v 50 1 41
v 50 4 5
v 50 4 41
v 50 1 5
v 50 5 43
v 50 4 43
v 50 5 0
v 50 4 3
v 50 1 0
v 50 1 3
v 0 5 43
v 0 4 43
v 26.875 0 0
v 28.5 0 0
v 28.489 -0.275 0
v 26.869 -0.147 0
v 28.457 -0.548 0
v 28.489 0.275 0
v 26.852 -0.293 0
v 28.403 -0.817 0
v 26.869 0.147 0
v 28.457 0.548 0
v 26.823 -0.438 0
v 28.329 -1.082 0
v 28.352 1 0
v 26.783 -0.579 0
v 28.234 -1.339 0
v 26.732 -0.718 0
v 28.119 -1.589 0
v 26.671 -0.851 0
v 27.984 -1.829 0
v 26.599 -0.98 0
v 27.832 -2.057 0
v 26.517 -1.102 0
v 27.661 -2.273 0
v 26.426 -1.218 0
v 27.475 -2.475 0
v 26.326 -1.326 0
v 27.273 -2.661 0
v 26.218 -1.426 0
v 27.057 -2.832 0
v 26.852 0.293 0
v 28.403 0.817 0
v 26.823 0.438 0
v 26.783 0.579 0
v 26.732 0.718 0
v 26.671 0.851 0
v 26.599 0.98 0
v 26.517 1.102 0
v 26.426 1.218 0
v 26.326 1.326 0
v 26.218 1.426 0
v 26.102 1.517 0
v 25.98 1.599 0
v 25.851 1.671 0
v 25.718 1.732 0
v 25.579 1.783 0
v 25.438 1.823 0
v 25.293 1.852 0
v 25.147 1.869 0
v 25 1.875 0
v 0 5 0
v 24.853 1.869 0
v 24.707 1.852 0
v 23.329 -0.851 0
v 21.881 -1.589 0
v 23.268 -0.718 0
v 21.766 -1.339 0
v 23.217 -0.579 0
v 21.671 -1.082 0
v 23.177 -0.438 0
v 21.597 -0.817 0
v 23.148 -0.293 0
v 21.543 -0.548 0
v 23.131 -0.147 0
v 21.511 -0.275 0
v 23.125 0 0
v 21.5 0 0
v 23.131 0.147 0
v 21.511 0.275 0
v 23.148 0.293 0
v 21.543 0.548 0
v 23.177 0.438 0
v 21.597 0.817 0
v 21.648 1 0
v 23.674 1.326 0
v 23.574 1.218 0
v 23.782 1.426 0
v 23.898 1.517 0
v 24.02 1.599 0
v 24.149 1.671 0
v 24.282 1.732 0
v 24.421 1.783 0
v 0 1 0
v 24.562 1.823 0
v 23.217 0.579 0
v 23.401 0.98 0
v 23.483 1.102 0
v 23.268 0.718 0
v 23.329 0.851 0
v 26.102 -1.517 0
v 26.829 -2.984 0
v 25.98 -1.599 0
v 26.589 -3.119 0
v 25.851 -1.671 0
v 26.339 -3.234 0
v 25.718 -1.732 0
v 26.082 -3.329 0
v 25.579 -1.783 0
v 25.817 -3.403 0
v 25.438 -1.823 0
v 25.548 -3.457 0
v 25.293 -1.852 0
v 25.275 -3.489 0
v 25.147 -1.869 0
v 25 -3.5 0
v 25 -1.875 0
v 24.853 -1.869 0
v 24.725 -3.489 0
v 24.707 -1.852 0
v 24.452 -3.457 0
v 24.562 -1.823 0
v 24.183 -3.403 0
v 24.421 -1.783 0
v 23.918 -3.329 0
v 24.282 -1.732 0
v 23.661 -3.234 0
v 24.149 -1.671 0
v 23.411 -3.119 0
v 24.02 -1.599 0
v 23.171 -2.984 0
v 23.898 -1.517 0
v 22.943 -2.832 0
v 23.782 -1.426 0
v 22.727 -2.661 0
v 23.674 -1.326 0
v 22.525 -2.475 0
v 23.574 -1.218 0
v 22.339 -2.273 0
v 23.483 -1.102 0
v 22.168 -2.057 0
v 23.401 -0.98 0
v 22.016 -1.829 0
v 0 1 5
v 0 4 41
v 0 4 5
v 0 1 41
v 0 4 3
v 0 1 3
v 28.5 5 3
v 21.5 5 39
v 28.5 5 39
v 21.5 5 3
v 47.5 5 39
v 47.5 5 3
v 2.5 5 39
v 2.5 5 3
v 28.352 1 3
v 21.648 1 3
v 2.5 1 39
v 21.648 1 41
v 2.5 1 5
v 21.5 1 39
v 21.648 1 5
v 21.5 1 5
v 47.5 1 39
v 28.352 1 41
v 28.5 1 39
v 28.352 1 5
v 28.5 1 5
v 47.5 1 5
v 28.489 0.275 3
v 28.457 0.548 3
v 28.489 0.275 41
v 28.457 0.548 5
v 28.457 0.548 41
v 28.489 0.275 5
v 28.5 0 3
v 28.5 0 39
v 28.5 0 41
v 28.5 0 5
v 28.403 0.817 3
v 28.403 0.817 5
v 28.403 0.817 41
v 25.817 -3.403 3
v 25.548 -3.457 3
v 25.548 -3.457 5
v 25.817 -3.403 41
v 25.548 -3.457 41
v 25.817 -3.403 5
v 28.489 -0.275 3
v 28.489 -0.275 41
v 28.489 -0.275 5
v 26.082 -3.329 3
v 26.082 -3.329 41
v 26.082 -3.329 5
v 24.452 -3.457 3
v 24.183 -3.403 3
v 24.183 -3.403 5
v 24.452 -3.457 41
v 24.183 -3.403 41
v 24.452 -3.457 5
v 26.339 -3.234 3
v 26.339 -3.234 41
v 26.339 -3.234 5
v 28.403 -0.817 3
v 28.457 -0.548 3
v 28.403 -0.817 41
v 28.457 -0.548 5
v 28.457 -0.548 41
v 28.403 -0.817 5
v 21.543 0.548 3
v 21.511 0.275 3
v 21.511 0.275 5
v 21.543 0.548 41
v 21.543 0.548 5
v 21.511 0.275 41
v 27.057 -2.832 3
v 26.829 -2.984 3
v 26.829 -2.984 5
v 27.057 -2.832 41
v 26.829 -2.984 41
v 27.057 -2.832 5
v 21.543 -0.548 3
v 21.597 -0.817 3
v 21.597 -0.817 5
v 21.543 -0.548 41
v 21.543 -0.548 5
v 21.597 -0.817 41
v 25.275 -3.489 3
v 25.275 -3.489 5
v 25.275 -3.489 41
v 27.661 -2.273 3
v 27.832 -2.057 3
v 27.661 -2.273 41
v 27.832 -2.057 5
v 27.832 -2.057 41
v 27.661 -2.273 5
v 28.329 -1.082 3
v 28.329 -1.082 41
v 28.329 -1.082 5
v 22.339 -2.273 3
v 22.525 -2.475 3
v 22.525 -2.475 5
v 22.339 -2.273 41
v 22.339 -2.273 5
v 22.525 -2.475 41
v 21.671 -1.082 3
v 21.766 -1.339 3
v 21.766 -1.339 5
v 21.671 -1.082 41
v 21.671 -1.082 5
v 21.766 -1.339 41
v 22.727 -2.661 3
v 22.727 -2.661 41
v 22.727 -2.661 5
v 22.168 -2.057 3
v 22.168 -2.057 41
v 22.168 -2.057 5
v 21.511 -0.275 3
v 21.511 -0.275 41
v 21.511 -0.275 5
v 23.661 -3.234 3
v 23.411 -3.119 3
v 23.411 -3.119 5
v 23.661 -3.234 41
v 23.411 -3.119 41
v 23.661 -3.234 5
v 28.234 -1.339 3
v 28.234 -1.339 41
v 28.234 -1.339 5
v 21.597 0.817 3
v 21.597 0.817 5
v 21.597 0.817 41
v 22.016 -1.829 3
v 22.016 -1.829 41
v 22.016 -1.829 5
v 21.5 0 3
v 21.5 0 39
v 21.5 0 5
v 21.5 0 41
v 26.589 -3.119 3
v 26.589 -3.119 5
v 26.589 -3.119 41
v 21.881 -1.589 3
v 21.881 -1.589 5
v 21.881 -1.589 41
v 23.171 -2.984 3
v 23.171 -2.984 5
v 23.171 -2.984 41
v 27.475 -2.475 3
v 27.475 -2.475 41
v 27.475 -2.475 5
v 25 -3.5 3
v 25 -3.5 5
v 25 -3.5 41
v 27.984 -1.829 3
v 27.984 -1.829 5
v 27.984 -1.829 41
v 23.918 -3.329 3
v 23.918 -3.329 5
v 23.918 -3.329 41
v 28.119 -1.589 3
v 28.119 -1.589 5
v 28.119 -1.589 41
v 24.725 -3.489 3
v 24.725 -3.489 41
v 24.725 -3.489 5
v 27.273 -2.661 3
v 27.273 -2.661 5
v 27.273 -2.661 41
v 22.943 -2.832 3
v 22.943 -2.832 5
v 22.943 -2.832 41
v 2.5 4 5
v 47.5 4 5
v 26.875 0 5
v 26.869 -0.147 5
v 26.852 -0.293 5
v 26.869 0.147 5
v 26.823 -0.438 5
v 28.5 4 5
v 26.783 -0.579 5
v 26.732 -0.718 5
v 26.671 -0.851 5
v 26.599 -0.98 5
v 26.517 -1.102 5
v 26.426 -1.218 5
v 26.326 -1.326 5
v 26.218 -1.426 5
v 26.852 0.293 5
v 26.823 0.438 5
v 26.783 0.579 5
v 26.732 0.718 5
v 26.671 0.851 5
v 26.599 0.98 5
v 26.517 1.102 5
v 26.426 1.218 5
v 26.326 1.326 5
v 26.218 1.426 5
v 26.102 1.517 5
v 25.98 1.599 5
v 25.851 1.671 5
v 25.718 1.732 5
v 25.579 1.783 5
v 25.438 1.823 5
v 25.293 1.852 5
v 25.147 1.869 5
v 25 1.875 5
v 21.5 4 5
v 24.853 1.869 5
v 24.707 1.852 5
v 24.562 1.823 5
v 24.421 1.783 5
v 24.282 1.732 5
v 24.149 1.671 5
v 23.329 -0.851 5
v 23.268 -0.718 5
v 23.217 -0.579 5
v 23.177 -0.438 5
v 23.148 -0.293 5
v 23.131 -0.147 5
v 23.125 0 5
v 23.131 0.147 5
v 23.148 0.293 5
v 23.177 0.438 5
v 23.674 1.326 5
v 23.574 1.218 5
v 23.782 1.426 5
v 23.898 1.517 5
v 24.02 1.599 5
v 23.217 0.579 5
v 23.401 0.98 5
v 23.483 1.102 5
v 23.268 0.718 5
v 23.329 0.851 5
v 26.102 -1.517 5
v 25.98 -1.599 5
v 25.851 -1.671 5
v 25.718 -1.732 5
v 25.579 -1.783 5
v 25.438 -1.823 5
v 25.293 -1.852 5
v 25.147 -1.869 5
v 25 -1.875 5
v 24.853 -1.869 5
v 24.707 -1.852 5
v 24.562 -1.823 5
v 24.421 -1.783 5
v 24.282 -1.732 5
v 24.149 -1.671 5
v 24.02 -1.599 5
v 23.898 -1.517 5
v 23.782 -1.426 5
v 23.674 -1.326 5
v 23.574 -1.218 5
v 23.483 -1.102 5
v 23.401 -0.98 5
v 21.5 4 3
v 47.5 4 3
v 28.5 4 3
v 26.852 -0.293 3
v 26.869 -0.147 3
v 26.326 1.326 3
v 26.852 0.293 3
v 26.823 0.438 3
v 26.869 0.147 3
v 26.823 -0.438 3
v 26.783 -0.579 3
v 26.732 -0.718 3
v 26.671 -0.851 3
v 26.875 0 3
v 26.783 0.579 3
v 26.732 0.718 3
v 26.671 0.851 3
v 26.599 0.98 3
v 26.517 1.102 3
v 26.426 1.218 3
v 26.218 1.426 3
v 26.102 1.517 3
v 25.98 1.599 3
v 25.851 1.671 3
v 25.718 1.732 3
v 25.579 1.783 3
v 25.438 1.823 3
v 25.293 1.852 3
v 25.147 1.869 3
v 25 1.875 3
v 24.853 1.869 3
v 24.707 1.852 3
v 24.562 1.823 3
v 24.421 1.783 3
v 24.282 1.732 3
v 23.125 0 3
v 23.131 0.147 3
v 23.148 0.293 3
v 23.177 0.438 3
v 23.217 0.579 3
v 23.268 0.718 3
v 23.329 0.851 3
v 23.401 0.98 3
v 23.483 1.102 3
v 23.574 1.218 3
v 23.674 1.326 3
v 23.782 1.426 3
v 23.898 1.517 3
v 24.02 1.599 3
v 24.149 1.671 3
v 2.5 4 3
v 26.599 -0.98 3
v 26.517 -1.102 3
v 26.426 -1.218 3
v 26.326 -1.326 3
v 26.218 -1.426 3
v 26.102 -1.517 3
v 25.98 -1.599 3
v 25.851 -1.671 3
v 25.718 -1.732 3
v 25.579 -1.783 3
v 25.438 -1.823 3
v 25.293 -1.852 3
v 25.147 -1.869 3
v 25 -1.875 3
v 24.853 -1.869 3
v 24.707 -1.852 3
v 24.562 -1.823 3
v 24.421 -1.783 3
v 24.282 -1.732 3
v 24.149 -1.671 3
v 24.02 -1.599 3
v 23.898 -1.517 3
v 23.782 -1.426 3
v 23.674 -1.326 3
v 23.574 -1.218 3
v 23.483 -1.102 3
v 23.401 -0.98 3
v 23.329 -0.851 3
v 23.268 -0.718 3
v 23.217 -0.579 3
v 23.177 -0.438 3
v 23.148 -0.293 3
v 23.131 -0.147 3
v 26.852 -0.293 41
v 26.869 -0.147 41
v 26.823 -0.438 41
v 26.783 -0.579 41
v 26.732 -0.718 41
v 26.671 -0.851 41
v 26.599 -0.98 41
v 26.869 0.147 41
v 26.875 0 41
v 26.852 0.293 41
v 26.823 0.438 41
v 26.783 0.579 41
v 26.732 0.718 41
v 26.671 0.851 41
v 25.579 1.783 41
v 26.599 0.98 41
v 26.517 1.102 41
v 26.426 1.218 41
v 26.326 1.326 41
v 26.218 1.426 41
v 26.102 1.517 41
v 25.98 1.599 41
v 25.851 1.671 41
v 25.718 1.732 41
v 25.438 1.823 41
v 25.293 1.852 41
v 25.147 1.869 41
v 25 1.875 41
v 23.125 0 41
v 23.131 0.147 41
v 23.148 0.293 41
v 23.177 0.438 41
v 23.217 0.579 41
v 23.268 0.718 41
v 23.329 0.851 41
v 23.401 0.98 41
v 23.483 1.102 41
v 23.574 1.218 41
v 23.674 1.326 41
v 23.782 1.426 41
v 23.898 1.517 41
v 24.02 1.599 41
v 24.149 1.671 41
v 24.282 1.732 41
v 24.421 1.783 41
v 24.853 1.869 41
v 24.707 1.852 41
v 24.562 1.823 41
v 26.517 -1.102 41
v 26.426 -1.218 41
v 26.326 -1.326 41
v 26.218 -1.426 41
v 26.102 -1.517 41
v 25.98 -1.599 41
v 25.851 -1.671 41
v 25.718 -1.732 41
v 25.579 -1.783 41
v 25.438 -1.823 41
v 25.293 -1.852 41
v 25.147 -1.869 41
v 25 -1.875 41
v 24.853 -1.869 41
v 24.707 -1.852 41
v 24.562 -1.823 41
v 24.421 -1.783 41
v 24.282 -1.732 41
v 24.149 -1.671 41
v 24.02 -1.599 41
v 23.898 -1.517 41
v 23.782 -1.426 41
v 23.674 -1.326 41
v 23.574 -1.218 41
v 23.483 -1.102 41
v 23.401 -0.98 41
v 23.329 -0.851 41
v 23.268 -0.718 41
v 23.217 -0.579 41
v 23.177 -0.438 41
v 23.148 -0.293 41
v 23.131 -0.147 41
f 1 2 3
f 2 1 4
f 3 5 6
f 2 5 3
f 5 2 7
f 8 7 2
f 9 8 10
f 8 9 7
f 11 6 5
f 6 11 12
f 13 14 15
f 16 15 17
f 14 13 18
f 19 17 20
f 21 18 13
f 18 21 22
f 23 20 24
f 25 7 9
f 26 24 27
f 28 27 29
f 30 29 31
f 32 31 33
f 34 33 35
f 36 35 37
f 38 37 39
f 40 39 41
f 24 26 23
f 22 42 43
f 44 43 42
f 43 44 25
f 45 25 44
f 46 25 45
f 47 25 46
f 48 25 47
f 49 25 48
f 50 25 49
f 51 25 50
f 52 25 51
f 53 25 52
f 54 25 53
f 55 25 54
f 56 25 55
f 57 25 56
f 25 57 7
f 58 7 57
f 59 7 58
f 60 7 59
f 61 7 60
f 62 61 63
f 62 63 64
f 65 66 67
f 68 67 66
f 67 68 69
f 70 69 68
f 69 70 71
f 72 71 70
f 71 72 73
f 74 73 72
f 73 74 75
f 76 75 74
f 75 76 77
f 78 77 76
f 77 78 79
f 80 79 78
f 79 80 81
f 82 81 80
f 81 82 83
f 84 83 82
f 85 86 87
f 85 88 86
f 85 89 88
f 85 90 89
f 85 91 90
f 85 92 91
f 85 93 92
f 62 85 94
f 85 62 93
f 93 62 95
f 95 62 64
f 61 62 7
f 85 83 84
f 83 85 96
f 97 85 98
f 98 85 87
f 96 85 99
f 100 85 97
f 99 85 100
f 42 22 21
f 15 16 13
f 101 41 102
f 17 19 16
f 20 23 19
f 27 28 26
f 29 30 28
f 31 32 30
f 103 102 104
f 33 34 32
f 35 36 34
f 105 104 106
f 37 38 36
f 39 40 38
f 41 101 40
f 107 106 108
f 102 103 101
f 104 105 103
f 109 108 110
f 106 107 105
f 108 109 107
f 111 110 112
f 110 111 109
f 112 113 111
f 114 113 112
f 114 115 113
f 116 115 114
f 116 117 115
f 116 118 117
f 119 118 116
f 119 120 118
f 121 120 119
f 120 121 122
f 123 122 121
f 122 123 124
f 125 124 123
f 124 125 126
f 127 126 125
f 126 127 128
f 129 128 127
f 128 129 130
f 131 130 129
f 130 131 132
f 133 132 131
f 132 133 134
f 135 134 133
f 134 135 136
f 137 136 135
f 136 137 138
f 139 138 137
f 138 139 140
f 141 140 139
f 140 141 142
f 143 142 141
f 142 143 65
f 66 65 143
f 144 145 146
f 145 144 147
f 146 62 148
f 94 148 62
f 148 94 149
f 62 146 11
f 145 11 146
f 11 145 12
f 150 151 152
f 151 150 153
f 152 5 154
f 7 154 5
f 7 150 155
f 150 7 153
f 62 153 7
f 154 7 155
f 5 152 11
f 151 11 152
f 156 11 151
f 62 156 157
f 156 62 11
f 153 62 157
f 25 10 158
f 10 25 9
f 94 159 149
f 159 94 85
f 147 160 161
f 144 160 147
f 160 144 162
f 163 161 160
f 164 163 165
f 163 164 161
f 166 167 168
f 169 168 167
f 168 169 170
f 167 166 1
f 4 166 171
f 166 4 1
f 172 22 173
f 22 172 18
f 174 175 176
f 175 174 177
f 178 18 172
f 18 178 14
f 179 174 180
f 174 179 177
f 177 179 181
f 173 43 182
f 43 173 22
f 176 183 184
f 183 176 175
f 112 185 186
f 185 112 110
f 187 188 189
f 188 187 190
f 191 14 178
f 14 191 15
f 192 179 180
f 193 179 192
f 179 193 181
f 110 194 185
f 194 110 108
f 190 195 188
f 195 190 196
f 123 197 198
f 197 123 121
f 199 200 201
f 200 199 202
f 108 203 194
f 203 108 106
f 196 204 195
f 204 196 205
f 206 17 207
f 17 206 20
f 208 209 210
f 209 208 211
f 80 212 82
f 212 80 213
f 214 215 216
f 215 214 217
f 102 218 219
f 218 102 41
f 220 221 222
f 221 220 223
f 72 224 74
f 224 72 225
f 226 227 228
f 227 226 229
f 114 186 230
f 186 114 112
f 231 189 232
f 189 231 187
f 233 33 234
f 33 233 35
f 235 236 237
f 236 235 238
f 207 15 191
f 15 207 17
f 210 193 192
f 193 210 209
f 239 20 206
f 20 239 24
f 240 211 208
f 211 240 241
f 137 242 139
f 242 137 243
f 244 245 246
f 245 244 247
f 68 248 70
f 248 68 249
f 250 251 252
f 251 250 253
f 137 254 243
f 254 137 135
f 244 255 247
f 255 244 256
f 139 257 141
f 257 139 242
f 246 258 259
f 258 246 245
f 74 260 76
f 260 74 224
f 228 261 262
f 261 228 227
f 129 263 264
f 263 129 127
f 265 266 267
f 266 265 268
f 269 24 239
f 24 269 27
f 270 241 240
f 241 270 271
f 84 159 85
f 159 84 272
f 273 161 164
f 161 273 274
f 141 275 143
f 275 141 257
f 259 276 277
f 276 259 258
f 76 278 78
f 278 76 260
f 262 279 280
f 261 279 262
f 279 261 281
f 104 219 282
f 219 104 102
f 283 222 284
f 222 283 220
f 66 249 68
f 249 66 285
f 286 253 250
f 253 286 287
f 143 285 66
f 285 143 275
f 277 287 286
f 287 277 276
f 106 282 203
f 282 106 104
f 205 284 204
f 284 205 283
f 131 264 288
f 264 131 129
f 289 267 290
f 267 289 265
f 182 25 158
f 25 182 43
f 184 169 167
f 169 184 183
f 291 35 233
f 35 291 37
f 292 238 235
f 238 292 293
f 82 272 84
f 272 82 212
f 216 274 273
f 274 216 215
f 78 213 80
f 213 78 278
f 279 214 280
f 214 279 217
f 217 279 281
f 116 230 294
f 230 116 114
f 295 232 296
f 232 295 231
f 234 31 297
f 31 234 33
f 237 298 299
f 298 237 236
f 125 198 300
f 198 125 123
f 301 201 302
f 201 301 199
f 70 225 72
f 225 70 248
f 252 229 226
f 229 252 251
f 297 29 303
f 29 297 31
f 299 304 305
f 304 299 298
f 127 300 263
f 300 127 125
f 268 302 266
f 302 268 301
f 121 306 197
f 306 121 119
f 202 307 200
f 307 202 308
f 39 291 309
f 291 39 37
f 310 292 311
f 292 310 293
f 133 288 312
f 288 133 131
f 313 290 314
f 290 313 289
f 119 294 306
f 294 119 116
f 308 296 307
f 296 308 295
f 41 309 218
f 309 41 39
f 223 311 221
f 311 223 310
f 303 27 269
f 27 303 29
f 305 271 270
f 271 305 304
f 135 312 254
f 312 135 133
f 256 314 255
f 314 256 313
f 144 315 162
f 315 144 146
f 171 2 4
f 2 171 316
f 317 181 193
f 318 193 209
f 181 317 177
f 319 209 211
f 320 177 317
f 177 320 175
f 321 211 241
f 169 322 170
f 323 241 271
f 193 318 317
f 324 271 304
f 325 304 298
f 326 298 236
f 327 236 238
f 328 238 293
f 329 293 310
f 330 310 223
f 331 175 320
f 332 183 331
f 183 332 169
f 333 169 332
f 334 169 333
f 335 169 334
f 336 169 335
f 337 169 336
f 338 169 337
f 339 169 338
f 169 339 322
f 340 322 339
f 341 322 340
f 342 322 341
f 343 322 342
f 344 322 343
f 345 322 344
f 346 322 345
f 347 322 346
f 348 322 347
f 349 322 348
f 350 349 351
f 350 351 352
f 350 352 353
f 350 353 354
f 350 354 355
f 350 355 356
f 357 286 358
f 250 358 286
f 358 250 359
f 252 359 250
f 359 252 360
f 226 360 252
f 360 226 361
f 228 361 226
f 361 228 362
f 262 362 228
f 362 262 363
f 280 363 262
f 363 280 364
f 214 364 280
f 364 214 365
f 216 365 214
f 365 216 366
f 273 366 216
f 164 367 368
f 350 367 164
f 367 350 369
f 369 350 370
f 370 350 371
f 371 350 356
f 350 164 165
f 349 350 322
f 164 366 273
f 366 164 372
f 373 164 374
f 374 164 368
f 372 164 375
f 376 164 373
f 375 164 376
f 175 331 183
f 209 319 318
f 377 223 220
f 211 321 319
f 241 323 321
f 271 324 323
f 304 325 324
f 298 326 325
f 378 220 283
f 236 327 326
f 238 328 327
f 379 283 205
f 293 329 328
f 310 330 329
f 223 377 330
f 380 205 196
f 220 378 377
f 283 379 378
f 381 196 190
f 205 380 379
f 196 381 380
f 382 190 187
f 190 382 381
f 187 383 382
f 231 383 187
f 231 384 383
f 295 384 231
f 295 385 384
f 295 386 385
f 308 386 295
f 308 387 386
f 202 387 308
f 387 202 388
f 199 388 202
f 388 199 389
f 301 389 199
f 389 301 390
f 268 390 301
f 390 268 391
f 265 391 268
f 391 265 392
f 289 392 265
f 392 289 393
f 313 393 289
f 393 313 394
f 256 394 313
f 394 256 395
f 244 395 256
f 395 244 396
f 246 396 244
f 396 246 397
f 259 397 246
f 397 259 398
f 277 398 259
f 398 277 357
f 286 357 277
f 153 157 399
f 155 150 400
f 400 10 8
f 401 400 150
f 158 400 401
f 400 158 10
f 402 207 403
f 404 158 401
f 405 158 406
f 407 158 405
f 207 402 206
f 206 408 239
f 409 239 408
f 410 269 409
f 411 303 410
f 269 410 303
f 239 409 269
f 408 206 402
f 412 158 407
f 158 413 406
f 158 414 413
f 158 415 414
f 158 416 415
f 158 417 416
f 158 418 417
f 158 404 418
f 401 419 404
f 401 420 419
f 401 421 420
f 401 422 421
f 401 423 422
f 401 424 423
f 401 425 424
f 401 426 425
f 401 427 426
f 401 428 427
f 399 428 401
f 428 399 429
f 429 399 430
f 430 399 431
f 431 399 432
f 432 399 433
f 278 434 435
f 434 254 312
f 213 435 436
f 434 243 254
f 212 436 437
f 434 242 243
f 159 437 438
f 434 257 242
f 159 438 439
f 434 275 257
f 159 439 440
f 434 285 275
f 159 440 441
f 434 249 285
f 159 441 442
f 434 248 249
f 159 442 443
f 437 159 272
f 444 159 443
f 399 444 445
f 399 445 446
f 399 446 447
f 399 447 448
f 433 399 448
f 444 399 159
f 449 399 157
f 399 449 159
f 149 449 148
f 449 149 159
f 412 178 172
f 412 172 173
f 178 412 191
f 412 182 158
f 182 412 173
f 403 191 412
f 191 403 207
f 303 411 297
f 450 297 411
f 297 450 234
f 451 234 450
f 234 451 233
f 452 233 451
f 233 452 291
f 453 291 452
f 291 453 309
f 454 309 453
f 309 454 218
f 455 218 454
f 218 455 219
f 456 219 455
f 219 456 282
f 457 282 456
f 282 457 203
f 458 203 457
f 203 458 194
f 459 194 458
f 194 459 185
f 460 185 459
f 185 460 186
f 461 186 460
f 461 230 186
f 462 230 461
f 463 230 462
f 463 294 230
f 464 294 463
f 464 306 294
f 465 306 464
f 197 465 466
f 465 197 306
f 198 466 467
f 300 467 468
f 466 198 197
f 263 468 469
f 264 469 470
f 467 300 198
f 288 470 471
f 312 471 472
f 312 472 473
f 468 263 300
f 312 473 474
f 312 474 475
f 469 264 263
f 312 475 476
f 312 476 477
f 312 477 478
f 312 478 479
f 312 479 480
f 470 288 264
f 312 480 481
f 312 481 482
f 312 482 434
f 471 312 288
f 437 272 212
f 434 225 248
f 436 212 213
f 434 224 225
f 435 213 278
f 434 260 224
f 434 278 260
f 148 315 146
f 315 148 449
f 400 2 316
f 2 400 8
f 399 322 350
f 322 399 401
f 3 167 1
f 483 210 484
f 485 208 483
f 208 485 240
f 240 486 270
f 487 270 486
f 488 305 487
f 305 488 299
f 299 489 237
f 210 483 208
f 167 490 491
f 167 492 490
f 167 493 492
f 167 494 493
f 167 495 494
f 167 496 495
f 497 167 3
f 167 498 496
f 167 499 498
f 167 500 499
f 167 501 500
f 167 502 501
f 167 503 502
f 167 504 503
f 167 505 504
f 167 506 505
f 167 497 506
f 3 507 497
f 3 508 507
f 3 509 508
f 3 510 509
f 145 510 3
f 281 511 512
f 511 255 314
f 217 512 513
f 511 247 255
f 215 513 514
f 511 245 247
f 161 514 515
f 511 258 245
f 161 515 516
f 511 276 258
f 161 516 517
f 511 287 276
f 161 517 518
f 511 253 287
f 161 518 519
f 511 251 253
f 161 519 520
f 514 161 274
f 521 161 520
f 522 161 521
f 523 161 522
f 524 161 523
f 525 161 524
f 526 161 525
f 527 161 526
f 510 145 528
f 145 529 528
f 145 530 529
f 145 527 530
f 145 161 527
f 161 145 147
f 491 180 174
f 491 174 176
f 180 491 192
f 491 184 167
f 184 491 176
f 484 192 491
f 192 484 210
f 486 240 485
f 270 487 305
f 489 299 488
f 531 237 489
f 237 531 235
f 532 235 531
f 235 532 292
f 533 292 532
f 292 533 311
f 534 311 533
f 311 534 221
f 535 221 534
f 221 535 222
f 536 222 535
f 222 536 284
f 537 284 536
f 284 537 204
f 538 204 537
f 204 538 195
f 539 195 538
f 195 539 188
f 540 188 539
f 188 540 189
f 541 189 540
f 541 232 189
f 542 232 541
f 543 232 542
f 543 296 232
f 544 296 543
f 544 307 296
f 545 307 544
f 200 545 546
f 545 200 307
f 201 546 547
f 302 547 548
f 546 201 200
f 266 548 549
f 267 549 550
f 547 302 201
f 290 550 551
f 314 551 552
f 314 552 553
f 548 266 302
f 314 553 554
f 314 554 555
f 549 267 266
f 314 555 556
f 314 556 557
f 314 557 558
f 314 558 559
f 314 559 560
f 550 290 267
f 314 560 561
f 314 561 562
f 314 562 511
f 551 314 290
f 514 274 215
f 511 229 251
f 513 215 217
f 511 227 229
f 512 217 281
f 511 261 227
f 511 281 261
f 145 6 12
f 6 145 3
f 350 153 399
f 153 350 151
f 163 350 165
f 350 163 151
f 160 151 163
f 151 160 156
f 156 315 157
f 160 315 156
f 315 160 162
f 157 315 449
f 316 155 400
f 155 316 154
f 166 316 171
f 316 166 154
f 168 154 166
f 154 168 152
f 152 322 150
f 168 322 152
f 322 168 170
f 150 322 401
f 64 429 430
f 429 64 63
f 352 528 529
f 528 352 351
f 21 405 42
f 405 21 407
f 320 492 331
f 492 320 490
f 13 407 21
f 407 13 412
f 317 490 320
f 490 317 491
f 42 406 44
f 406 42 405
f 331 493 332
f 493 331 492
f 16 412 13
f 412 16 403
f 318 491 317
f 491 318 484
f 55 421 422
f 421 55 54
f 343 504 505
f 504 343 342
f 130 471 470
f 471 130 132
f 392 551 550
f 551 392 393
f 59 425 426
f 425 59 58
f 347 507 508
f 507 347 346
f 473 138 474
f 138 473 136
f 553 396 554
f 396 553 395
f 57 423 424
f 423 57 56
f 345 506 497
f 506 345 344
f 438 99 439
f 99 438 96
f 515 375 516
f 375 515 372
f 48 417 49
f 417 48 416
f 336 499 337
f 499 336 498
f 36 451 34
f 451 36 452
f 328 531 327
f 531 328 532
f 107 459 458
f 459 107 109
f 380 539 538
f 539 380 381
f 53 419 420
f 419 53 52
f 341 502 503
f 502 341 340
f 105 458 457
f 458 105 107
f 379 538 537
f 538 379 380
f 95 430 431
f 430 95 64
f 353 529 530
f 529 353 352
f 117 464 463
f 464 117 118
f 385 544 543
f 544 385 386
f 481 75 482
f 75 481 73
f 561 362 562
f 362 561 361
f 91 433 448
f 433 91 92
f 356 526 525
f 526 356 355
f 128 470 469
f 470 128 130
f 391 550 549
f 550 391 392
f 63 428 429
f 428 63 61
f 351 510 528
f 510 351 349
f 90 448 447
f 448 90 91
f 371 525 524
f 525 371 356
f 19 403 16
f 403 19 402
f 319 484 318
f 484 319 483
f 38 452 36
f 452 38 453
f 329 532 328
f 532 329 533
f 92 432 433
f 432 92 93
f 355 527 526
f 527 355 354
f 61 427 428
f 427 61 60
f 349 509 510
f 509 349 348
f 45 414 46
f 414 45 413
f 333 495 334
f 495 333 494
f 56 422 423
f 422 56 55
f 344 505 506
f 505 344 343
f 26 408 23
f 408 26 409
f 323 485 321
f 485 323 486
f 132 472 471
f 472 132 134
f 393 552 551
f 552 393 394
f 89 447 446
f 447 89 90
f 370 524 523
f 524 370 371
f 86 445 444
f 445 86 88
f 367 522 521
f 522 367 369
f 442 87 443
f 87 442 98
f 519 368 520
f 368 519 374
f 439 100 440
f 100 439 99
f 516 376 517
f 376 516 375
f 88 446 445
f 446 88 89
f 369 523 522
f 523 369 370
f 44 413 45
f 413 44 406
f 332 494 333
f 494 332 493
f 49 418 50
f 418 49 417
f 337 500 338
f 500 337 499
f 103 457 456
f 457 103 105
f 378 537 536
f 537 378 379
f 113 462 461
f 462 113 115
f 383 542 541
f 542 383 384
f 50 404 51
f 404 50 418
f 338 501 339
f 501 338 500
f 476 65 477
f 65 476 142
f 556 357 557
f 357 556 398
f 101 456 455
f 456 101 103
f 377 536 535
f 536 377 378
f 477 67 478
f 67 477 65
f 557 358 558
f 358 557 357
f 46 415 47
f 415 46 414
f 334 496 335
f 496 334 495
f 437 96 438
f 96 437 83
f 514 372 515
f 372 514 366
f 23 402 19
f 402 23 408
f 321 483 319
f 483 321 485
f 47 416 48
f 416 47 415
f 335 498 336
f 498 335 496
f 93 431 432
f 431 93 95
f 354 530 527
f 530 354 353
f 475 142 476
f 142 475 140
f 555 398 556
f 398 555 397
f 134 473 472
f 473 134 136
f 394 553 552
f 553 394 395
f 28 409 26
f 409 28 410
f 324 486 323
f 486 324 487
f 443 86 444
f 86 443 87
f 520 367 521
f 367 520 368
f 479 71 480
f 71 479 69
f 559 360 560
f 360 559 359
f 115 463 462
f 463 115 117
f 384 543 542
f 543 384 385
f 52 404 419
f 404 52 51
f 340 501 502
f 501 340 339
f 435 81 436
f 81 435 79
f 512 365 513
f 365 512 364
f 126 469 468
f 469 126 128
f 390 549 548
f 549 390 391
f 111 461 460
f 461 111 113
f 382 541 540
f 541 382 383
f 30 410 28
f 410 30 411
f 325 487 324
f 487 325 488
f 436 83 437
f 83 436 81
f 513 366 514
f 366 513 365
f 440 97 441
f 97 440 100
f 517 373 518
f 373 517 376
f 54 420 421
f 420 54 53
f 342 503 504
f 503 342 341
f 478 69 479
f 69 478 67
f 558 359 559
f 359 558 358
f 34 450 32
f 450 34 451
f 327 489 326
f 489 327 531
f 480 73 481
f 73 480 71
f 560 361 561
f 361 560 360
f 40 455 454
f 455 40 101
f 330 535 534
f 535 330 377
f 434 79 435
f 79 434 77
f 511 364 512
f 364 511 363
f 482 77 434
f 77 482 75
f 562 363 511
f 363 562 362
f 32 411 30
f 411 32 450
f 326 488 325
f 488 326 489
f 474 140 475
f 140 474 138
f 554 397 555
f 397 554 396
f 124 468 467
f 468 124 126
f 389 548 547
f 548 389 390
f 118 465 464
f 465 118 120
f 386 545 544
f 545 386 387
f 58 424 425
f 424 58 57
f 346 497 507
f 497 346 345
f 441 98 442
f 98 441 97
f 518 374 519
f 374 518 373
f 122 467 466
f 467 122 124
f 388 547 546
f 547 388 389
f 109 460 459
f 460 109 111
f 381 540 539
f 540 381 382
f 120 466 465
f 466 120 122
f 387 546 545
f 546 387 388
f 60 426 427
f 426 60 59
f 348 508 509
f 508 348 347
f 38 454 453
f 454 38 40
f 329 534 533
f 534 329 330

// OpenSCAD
//how many boards?
board_number=2;

//base hight: 
base_height=3;

//space between boards:
perf_board_spacing=38;



/////////////////////////////////////////////


horz_space=2;

wall_hight= perf_board_spacing*(board_number-1);

bolt_thickness=3;

wall_thickness=2;

wall_width=50;

perf_thickness=2;

wall_hole_hight=perf_board_spacing-wall_thickness;

resolution=80;

	difference()
{
		union()
	{
 
	
//main wall board hights
			translate([0, 1,0])
				cube([wall_width, wall_thickness+2, wall_hight + base_height+perf_thickness]);	

//bolt post 
			color ("orange")
			translate([wall_width/2,0, 0])
				cylinder(r=(bolt_thickness/2)+wall_thickness,h=wall_hight + base_height+perf_thickness,$fn=resolution);			

		
	
}
//bolt post cutout
			color ("blue")
			translate([wall_width/2,0,-1])
				cylinder(r=(bolt_thickness+.75)/2,h=wall_hight + base_height+perf_thickness+2,$fn=resolution);
	

//perfboard cutout slot
	for (i = [0:(board_number-1)])
	{
			color ("purple")
			translate([0, -bolt_thickness*2 ,base_height+perf_board_spacing*i])
				cube([wall_width,(bolt_thickness*2)+(wall_thickness*2),perf_thickness]);
	}

//wall holes
	for (i = [0:(board_number-2)])
	{
			color ("cyan")
			translate([2.50,0,base_height+perf_board_spacing*i])
				cube([19,bolt_thickness+wall_thickness,wall_hole_hight]);

			color ("cyan")
			translate([28.5,0,base_height+perf_board_spacing*i])
				cube([19,bolt_thickness+wall_thickness,wall_hole_hight]);
	}

			
}
